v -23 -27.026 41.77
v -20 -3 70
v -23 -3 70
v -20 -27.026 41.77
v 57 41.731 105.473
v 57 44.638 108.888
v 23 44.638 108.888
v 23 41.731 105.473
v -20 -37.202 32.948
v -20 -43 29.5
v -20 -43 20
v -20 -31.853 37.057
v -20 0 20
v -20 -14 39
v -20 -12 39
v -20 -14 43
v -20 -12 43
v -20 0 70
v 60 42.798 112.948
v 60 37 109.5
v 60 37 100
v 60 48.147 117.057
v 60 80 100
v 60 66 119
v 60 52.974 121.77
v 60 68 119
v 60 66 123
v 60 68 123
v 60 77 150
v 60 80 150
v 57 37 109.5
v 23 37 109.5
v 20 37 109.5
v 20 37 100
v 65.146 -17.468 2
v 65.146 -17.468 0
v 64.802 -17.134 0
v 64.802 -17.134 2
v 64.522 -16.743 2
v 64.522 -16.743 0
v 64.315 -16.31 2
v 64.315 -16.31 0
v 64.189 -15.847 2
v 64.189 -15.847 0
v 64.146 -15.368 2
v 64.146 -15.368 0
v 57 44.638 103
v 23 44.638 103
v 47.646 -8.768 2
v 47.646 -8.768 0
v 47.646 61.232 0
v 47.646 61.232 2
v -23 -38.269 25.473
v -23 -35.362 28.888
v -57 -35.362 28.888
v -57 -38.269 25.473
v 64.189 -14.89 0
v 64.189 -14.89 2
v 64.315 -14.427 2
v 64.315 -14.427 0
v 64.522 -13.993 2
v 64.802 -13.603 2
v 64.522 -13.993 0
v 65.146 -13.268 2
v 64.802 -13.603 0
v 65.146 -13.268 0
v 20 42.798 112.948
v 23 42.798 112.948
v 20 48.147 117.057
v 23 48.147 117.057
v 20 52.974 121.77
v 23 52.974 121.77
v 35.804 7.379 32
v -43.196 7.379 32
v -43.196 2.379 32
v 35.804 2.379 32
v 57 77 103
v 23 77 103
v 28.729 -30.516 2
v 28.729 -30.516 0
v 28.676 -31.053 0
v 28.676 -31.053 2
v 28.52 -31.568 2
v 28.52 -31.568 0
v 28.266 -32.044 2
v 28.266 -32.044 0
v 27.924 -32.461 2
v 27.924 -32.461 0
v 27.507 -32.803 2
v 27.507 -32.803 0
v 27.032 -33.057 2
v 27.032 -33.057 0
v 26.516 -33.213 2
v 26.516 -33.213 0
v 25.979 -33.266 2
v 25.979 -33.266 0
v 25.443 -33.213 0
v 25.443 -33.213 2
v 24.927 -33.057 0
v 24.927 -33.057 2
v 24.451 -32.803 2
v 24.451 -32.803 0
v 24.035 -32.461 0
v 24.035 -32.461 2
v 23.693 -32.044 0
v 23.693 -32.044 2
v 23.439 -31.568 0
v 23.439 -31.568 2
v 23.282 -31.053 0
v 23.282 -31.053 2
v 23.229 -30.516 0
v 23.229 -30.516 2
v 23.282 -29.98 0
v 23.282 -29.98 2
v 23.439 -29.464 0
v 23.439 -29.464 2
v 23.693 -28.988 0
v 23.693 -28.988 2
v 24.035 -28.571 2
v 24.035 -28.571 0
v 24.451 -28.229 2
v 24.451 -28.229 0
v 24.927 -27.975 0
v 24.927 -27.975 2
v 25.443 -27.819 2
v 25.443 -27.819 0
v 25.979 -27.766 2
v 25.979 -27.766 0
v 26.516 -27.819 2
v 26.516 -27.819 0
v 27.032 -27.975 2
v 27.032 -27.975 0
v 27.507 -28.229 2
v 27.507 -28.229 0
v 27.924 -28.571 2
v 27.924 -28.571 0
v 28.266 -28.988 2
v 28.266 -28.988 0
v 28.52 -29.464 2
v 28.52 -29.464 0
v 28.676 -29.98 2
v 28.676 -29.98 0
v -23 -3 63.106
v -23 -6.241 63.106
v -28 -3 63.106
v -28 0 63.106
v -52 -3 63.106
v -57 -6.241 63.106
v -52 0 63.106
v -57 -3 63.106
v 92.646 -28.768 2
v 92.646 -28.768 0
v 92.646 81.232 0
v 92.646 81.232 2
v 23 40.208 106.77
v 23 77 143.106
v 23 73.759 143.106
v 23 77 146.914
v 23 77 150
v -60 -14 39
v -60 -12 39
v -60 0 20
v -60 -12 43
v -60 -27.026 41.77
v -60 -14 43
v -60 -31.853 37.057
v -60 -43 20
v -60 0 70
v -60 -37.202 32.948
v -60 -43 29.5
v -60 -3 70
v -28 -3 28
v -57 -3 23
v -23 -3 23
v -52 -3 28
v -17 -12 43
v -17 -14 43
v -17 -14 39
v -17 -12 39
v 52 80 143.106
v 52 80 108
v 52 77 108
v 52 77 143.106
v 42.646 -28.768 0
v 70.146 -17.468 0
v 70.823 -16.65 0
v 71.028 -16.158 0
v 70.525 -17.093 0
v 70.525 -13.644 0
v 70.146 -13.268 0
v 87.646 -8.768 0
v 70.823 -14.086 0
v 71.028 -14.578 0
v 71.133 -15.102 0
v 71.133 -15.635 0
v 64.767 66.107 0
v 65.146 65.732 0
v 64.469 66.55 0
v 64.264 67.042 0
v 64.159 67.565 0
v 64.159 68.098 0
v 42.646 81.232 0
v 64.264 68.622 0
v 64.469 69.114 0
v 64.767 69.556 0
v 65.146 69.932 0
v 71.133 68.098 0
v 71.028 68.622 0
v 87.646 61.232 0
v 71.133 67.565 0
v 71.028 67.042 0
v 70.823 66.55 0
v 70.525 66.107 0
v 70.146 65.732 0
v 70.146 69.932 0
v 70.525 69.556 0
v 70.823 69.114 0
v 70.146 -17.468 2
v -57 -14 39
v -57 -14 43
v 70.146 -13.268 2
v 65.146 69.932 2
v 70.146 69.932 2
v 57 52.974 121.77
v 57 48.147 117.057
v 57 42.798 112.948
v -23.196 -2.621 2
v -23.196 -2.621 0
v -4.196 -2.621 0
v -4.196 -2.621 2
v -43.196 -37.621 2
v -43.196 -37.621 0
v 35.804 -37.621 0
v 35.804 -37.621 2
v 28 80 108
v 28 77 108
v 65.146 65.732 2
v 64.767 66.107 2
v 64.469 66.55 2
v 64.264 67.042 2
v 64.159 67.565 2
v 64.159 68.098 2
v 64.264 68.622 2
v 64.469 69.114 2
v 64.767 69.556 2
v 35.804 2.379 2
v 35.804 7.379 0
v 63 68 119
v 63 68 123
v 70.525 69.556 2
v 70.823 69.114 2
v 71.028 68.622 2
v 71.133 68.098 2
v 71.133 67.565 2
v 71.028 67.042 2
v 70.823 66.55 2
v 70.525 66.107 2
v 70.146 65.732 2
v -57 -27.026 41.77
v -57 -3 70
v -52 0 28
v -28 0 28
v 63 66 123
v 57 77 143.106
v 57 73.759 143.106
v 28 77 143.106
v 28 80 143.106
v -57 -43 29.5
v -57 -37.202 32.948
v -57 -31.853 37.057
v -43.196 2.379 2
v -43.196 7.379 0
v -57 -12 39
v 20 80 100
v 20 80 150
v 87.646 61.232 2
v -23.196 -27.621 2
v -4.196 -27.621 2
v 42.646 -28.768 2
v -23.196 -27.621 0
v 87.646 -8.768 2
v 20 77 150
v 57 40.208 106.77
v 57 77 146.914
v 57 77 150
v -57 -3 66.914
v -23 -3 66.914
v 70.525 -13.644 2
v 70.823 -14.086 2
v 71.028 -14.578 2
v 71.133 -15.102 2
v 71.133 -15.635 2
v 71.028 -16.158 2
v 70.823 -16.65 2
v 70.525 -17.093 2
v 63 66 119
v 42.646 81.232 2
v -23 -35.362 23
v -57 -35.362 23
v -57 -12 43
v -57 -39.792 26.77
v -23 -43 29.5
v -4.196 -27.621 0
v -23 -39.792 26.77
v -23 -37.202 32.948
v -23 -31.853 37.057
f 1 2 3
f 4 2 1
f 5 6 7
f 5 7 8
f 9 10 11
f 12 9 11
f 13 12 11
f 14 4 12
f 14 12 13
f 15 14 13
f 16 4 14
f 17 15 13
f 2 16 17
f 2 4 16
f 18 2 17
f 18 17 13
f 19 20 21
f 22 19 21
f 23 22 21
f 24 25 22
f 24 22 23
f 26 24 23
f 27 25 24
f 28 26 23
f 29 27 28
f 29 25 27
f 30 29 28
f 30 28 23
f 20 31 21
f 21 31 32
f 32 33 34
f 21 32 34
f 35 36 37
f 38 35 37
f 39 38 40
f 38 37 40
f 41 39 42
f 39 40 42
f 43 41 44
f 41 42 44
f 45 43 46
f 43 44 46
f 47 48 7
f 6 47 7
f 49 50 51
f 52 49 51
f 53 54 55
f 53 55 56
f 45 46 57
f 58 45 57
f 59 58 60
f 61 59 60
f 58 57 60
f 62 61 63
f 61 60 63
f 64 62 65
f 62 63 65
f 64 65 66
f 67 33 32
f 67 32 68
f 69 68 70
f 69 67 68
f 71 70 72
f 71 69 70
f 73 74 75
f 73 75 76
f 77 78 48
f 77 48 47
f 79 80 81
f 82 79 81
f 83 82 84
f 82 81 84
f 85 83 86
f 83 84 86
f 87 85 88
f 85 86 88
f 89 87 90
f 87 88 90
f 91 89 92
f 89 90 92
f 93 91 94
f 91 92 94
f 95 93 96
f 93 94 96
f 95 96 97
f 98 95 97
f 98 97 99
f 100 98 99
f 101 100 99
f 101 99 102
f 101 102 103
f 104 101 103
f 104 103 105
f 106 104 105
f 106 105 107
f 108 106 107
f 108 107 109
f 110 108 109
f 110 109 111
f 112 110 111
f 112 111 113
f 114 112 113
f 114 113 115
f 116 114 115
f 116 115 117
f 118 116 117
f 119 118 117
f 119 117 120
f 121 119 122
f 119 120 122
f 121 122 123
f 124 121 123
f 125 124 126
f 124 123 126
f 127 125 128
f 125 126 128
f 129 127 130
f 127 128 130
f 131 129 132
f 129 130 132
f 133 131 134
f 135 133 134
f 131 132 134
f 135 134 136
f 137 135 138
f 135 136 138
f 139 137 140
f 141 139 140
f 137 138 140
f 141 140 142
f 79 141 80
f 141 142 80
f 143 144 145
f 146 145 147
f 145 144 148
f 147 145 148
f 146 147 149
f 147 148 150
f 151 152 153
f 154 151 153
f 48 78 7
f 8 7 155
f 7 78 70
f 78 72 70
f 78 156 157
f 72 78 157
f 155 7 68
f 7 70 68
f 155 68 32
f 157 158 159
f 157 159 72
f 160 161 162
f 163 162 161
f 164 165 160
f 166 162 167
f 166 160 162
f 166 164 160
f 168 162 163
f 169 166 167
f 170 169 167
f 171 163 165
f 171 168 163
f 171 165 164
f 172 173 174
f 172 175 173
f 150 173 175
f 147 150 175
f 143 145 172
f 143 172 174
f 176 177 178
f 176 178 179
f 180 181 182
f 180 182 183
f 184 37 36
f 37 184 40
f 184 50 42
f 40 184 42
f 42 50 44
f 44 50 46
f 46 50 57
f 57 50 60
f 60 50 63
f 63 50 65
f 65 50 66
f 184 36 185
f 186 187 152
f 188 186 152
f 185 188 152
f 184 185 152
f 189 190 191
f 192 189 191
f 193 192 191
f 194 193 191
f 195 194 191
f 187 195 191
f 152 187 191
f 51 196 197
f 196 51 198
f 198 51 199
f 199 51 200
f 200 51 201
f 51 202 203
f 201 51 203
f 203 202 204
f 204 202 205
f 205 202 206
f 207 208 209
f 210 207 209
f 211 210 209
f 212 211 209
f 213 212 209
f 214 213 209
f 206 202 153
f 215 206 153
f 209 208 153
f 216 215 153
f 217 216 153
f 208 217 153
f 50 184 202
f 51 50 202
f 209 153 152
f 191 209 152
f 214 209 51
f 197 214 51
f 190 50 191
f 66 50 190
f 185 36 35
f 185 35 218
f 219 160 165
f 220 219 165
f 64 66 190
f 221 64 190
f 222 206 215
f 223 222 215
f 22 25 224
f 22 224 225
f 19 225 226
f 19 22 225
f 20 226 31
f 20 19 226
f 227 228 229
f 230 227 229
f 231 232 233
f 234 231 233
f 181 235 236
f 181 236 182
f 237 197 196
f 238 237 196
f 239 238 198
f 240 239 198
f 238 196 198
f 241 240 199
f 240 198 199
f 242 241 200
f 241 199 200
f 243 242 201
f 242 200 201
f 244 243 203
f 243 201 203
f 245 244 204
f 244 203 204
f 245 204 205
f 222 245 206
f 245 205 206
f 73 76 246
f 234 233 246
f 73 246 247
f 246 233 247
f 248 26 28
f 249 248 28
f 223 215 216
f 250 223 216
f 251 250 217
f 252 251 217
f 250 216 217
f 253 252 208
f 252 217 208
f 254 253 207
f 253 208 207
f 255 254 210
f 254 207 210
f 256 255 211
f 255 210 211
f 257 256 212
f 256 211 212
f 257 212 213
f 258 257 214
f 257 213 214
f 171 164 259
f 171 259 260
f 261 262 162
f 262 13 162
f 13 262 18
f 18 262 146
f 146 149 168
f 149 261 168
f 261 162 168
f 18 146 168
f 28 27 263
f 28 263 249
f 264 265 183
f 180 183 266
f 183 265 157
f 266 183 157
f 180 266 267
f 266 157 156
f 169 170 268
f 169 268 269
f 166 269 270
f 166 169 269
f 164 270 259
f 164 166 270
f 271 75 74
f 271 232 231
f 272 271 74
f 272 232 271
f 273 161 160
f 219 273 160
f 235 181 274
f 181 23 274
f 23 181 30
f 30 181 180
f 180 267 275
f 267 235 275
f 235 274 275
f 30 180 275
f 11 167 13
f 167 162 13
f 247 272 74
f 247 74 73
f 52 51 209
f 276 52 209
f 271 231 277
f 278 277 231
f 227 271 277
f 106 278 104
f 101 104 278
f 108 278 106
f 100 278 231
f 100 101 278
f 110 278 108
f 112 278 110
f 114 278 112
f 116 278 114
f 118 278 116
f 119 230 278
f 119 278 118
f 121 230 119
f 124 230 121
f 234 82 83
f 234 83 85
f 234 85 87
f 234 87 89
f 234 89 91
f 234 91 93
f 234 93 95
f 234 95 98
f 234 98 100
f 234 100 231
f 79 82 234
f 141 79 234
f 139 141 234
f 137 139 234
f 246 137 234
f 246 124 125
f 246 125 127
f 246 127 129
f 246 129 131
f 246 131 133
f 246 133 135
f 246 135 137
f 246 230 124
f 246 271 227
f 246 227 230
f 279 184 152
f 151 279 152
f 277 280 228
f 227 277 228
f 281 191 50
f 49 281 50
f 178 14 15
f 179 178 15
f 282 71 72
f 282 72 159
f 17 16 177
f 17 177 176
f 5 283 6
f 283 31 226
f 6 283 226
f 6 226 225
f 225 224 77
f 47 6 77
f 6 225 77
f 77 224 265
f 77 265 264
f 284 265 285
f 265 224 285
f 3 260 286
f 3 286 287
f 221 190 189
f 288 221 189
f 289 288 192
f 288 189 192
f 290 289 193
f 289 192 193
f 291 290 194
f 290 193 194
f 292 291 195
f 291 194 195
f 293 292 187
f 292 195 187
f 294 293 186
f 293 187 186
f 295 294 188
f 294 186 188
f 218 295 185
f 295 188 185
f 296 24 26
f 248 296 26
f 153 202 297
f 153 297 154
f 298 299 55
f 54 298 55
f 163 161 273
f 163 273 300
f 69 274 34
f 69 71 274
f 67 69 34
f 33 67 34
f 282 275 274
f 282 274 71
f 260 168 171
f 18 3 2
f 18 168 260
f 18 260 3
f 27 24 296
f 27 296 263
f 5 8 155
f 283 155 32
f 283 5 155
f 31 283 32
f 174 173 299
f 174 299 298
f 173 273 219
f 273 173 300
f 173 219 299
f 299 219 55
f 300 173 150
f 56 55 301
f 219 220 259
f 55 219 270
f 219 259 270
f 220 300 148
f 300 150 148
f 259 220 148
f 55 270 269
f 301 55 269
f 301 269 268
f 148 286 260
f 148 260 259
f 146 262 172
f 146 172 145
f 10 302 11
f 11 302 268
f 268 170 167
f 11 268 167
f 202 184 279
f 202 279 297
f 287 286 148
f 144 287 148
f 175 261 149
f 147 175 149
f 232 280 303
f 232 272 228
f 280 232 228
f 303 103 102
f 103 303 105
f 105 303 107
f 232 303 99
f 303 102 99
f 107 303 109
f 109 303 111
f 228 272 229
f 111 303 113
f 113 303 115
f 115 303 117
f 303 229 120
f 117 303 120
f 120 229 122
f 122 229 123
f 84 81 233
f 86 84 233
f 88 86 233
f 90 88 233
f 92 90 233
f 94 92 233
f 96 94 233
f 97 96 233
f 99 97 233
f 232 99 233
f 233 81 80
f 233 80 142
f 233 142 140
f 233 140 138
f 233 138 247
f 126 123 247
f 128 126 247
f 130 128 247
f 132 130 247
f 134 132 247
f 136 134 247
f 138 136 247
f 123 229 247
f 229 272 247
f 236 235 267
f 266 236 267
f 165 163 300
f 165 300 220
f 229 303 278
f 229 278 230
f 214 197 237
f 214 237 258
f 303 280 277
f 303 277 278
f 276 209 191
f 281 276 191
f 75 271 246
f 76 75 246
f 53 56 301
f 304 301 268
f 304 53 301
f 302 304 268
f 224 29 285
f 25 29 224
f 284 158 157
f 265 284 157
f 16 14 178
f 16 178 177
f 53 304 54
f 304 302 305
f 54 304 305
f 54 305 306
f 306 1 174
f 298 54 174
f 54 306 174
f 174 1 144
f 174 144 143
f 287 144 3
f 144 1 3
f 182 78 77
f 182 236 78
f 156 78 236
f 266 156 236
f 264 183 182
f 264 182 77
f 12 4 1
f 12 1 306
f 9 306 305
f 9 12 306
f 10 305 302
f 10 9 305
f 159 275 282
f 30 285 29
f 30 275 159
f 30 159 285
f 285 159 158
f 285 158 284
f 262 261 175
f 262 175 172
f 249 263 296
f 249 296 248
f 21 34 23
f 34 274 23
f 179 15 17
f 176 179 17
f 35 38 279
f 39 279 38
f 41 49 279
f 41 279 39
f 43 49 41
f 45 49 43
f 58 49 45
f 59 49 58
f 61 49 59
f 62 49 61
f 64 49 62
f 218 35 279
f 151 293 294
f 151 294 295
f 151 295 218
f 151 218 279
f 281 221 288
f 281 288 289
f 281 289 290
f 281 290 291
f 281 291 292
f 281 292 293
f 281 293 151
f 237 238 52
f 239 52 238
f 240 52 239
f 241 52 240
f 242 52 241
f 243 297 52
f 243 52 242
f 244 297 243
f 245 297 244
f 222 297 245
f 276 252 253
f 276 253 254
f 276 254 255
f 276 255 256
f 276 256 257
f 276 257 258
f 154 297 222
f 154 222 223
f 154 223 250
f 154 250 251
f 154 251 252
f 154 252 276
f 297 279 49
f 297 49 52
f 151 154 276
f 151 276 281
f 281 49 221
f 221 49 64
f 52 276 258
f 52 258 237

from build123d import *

# Parameters (mm, degrees)
F0_W           = 40
F0_H           = 50
F0_W_2         = 24
F0_H_2         = 38
F1_DEPTH       = 3
F2_W           = 40
F2_H           = 3
F3_DEPTH       = 40
F5_DEPTH       = 3
F7_DEPTH       = 3
F8_W           = 3
F8_H           = 2.8935517733
F9_DEPTH       = 34
F11_DEPTH      = 37
F11_DEPTH_BACK = 3
F13_DEPTH      = 34
F14_W          = 2
F14_H          = 4
F15_DEPTH      = 3
F16_W          = 2
F16_H          = 4
F17_DEPTH      = 25
F19_DEPTH      = 3
F21_DEPTH      = 3
F23_W          = 2
F23_H          = 4
F24_DEPTH      = 3
F25_W          = 50
F25_H          = 110
F26_DEPTH      = 2
F28_DEPTH      = 25
F29_W          = 5
F29_H          = 4.2
F30_DEPTH      = 25
F32_W          = 79
F32_H          = 45
F32_W_2        = 19
F32_H_2        = 25
F33_DEPTH      = 2
F34_W          = 79
F34_H          = 5
F35_DEPTH      = 30
F36_R          = 2.75
F37_DEPTH      = 25


with BuildPart() as f1:
    # F0 (on Front) → F1 (new body)
    with BuildSketch(Plane.XZ):
        with Locations((-40, 45)):
            Rectangle(F0_W, F0_H)
        with Locations((-40, 47)):
            Rectangle(F0_W_2, F0_H_2, mode=Mode.SUBTRACT)
    extrude(amount=F1_DEPTH)

    # F2 (on face) → F3 (join)
    with BuildSketch(Plane.XZ.offset(3)):
        with Locations((-40, 21.5)):
            Rectangle(F2_W, F2_H)
    extrude(amount=F3_DEPTH)

    # F4 (on face) → F5 (join)
    with BuildSketch(Plane(origin=(-60, 0, 0), x_dir=(0, -1, 0), z_dir=(-1, 0, 0))):
        Polygon((43, 23), (3, 70), (3, 23), align=None)
    extrude(amount=-F5_DEPTH)

    # F6 (on face) → F7 (join)
    with BuildSketch(Plane.YZ.offset(-20)):
        Polygon((-3, 70), (-43, 23), (-3, 23), align=None)
    extrude(amount=-F7_DEPTH)

    # F8 (on face) → F9 (join, through all)
    with BuildSketch(Plane.YZ.offset(-57)):
        Polygon((-3, 66), (-3, 66.9141451752), (-6.2405931476, 63.1064482267), (-3, 63.1064482267), align=None)
        with Locations((-1.5, 64.5532241133)):
            Rectangle(F8_W, F8_H)
    extrude(amount=F9_DEPTH)

    # F10 (on face) → F11 (join, two sides)
    with BuildSketch(Plane.YZ.offset(-57)) as f11_sk:
        Polygon((-43, 23), (-35.3625, 23), (-43, 29.5), align=None)
    extrude(amount=F11_DEPTH)
    extrude(f11_sk.sketch, amount=-F11_DEPTH_BACK)

    # F12 (on face) → F13 (join, through all)
    with BuildSketch(Plane.YZ.offset(-57)):
        Polygon((-35.3625, 28.8882076752), (-38.2687300943, 25.4733873143), (-35.3625, 23), align=None)
    extrude(amount=F13_DEPTH)

    # F14 (on face) → F15 (join)
    with BuildSketch(Plane.YZ.offset(-20)):
        with Locations((-13, 41)):
            Rectangle(F14_W, F14_H)
    extrude(amount=F15_DEPTH)

    # F16 (on face) → F17 (cut)
    with BuildSketch(Plane(origin=(-60, 0, 0), x_dir=(0, -1, 0), z_dir=(-1, 0, 0))):
        with Locations((13, 41)):
            Rectangle(F16_W, F16_H)
    extrude(amount=-F17_DEPTH, mode=Mode.SUBTRACT)

    # F18 (on face) → F19 (join, through all)
    with BuildSketch(Plane(origin=(-60, 0, 0), x_dir=(0, -1, 0), z_dir=(-1, 0, 0))):
        with BuildLine():
            ThreePointArc((43, 29.5), (34.4666549031, 34.9236078783), (27.0258514269, 41.7696245734))
            Line((27.0258514269, 41.7696245734), (39.7918088737, 26.7696245734))
            Line((39.7918088737, 26.7696245734), (43, 29.5))
        make_face()
    extrude(amount=-F19_DEPTH)

    # F20 (on face) → F21 (join, through all)
    with BuildSketch(Plane.YZ.offset(-20)):
        with BuildLine():
            ThreePointArc((-27.0258514269, 41.7696245734), (-34.4666549031, 34.9236078783), (-43, 29.5))
            Line((-43, 29.5), (-39.7918088737, 26.7696245734))
            Line((-39.7918088737, 26.7696245734), (-27.0258514269, 41.7696245734))
        make_face()
    extrude(amount=-F21_DEPTH)


with BuildPart() as f22_1:
    # F22: copy of F1
    add(f1.part.moved(Location((80, 80, 80))))

    # F23 (on face) → F24 (join, through all)
    with BuildSketch(Plane(origin=(20, 0, 0), x_dir=(0, -1, 0), z_dir=(-1, 0, 0))):
        with Locations((-67, 121)):
            Rectangle(F23_W, F23_H)
    extrude(amount=-F24_DEPTH)


with BuildPart() as f26:
    # F25 (on Top) → F26 (new body)
    with BuildSketch(Plane.XY):
        with Locations((67.6461342699, 26.2317729229)):
            Rectangle(F25_W, F25_H)
    extrude(amount=F26_DEPTH)

    # F27 (on face) → F28 (cut)
    with BuildSketch(Plane(origin=(0, 0, 0), x_dir=(1, 0, 0), z_dir=(0, 0, -1))):
        Polygon((63.6029914021, -61.2317729229), (87.6461342699, -61.2317729229), (87.6461342699, -35.5290547013), (87.6461342699, 8.7682270771), (62.8203749657, 8.7682270771), (47.6461342699, 8.7682270771), (47.6461342699, -35.5290547013), (47.6461342699, -61.2317729229), align=None)
    extrude(amount=-F28_DEPTH, mode=Mode.SUBTRACT)

    # F29 (on face) → F30 (cut)
    with BuildSketch(Plane(origin=(0, 0, 0), x_dir=(1, 0, 0), z_dir=(0, 0, -1))):
        with BuildLine():
            ThreePointArc((71.1461342699, 15.3682270771), (70.8833719733, 16.5311974121), (70.1461342699, 17.4682270771))
            Line((70.1461342699, 17.4682270771), (70.1461342699, 13.2682270771))
            ThreePointArc((70.1461342699, 13.2682270771), (70.8833719733, 14.2052567421), (71.1461342699, 15.3682270771))
        make_face()
        with Locations((67.6461342699, 15.3682270771)):
            Rectangle(F29_W, F29_H)
        with BuildLine():
            Line((65.1461342699, 13.2682270771), (65.1461342699, 17.4682270771))
            ThreePointArc((65.1461342699, 17.4682270771), (64.4088965616, 16.5311974019), (64.1461342699, 15.3682270546))
            ThreePointArc((64.1461342699, 15.3682270546), (64.4088965713, 14.205256732), (65.1461342699, 13.2682270771))
        make_face()
        with Locations((67.6461342699, -67.8317729229)):
            Rectangle(F29_W, F29_H)
        with BuildLine():
            Line((70.1461342699, -65.7317729229), (70.1461342699, -69.9317729229))
            ThreePointArc((70.1461342699, -69.9317729229), (70.8833719733, -68.9947432579), (71.1461342699, -67.8317729229))
            ThreePointArc((71.1461342699, -67.8317729229), (70.8833719733, -66.6688025879), (70.1461342699, -65.7317729229))
        make_face()
        with BuildLine():
            ThreePointArc((64.1461342699, -67.8317729229), (64.4088965665, -68.9947432579), (65.1461342699, -69.9317729229))
            Line((65.1461342699, -69.9317729229), (65.1461342699, -65.7317729229))
            ThreePointArc((65.1461342699, -65.7317729229), (64.4088965665, -66.6688025879), (64.1461342699, -67.8317729229))
        make_face()
    extrude(amount=-F30_DEPTH, mode=Mode.SUBTRACT)


with BuildPart() as f33:
    # F32 (on face) → F33 (new body)
    with BuildSketch(Plane.XY):
        with Locations((-3.6956531787, -15.1206750181)):
            Rectangle(F32_W, F32_H)
        with Locations((-13.6956531787, -15.1206750181)):
            Rectangle(F32_W_2, F32_H_2, mode=Mode.SUBTRACT)
    extrude(amount=F33_DEPTH)

    # F34 (on face) → F35 (join)
    with BuildSketch(Plane.XY.offset(2)):
        with Locations((-3.6956531787, 4.8793249819)):
            Rectangle(F34_W, F34_H)
    extrude(amount=F35_DEPTH)

    # F36 (on face) → F37 (cut)
    with BuildSketch(Plane(origin=(0, 0, 0), x_dir=(1, 0, 0), z_dir=(0, 0, -1))):
        with Locations((25.9792152792, 30.5160041898)):
            Circle(F36_R)
    extrude(amount=-F37_DEPTH, mode=Mode.SUBTRACT)


solid = Compound([f1.part, f22_1.part, f26.part, f33.part])
